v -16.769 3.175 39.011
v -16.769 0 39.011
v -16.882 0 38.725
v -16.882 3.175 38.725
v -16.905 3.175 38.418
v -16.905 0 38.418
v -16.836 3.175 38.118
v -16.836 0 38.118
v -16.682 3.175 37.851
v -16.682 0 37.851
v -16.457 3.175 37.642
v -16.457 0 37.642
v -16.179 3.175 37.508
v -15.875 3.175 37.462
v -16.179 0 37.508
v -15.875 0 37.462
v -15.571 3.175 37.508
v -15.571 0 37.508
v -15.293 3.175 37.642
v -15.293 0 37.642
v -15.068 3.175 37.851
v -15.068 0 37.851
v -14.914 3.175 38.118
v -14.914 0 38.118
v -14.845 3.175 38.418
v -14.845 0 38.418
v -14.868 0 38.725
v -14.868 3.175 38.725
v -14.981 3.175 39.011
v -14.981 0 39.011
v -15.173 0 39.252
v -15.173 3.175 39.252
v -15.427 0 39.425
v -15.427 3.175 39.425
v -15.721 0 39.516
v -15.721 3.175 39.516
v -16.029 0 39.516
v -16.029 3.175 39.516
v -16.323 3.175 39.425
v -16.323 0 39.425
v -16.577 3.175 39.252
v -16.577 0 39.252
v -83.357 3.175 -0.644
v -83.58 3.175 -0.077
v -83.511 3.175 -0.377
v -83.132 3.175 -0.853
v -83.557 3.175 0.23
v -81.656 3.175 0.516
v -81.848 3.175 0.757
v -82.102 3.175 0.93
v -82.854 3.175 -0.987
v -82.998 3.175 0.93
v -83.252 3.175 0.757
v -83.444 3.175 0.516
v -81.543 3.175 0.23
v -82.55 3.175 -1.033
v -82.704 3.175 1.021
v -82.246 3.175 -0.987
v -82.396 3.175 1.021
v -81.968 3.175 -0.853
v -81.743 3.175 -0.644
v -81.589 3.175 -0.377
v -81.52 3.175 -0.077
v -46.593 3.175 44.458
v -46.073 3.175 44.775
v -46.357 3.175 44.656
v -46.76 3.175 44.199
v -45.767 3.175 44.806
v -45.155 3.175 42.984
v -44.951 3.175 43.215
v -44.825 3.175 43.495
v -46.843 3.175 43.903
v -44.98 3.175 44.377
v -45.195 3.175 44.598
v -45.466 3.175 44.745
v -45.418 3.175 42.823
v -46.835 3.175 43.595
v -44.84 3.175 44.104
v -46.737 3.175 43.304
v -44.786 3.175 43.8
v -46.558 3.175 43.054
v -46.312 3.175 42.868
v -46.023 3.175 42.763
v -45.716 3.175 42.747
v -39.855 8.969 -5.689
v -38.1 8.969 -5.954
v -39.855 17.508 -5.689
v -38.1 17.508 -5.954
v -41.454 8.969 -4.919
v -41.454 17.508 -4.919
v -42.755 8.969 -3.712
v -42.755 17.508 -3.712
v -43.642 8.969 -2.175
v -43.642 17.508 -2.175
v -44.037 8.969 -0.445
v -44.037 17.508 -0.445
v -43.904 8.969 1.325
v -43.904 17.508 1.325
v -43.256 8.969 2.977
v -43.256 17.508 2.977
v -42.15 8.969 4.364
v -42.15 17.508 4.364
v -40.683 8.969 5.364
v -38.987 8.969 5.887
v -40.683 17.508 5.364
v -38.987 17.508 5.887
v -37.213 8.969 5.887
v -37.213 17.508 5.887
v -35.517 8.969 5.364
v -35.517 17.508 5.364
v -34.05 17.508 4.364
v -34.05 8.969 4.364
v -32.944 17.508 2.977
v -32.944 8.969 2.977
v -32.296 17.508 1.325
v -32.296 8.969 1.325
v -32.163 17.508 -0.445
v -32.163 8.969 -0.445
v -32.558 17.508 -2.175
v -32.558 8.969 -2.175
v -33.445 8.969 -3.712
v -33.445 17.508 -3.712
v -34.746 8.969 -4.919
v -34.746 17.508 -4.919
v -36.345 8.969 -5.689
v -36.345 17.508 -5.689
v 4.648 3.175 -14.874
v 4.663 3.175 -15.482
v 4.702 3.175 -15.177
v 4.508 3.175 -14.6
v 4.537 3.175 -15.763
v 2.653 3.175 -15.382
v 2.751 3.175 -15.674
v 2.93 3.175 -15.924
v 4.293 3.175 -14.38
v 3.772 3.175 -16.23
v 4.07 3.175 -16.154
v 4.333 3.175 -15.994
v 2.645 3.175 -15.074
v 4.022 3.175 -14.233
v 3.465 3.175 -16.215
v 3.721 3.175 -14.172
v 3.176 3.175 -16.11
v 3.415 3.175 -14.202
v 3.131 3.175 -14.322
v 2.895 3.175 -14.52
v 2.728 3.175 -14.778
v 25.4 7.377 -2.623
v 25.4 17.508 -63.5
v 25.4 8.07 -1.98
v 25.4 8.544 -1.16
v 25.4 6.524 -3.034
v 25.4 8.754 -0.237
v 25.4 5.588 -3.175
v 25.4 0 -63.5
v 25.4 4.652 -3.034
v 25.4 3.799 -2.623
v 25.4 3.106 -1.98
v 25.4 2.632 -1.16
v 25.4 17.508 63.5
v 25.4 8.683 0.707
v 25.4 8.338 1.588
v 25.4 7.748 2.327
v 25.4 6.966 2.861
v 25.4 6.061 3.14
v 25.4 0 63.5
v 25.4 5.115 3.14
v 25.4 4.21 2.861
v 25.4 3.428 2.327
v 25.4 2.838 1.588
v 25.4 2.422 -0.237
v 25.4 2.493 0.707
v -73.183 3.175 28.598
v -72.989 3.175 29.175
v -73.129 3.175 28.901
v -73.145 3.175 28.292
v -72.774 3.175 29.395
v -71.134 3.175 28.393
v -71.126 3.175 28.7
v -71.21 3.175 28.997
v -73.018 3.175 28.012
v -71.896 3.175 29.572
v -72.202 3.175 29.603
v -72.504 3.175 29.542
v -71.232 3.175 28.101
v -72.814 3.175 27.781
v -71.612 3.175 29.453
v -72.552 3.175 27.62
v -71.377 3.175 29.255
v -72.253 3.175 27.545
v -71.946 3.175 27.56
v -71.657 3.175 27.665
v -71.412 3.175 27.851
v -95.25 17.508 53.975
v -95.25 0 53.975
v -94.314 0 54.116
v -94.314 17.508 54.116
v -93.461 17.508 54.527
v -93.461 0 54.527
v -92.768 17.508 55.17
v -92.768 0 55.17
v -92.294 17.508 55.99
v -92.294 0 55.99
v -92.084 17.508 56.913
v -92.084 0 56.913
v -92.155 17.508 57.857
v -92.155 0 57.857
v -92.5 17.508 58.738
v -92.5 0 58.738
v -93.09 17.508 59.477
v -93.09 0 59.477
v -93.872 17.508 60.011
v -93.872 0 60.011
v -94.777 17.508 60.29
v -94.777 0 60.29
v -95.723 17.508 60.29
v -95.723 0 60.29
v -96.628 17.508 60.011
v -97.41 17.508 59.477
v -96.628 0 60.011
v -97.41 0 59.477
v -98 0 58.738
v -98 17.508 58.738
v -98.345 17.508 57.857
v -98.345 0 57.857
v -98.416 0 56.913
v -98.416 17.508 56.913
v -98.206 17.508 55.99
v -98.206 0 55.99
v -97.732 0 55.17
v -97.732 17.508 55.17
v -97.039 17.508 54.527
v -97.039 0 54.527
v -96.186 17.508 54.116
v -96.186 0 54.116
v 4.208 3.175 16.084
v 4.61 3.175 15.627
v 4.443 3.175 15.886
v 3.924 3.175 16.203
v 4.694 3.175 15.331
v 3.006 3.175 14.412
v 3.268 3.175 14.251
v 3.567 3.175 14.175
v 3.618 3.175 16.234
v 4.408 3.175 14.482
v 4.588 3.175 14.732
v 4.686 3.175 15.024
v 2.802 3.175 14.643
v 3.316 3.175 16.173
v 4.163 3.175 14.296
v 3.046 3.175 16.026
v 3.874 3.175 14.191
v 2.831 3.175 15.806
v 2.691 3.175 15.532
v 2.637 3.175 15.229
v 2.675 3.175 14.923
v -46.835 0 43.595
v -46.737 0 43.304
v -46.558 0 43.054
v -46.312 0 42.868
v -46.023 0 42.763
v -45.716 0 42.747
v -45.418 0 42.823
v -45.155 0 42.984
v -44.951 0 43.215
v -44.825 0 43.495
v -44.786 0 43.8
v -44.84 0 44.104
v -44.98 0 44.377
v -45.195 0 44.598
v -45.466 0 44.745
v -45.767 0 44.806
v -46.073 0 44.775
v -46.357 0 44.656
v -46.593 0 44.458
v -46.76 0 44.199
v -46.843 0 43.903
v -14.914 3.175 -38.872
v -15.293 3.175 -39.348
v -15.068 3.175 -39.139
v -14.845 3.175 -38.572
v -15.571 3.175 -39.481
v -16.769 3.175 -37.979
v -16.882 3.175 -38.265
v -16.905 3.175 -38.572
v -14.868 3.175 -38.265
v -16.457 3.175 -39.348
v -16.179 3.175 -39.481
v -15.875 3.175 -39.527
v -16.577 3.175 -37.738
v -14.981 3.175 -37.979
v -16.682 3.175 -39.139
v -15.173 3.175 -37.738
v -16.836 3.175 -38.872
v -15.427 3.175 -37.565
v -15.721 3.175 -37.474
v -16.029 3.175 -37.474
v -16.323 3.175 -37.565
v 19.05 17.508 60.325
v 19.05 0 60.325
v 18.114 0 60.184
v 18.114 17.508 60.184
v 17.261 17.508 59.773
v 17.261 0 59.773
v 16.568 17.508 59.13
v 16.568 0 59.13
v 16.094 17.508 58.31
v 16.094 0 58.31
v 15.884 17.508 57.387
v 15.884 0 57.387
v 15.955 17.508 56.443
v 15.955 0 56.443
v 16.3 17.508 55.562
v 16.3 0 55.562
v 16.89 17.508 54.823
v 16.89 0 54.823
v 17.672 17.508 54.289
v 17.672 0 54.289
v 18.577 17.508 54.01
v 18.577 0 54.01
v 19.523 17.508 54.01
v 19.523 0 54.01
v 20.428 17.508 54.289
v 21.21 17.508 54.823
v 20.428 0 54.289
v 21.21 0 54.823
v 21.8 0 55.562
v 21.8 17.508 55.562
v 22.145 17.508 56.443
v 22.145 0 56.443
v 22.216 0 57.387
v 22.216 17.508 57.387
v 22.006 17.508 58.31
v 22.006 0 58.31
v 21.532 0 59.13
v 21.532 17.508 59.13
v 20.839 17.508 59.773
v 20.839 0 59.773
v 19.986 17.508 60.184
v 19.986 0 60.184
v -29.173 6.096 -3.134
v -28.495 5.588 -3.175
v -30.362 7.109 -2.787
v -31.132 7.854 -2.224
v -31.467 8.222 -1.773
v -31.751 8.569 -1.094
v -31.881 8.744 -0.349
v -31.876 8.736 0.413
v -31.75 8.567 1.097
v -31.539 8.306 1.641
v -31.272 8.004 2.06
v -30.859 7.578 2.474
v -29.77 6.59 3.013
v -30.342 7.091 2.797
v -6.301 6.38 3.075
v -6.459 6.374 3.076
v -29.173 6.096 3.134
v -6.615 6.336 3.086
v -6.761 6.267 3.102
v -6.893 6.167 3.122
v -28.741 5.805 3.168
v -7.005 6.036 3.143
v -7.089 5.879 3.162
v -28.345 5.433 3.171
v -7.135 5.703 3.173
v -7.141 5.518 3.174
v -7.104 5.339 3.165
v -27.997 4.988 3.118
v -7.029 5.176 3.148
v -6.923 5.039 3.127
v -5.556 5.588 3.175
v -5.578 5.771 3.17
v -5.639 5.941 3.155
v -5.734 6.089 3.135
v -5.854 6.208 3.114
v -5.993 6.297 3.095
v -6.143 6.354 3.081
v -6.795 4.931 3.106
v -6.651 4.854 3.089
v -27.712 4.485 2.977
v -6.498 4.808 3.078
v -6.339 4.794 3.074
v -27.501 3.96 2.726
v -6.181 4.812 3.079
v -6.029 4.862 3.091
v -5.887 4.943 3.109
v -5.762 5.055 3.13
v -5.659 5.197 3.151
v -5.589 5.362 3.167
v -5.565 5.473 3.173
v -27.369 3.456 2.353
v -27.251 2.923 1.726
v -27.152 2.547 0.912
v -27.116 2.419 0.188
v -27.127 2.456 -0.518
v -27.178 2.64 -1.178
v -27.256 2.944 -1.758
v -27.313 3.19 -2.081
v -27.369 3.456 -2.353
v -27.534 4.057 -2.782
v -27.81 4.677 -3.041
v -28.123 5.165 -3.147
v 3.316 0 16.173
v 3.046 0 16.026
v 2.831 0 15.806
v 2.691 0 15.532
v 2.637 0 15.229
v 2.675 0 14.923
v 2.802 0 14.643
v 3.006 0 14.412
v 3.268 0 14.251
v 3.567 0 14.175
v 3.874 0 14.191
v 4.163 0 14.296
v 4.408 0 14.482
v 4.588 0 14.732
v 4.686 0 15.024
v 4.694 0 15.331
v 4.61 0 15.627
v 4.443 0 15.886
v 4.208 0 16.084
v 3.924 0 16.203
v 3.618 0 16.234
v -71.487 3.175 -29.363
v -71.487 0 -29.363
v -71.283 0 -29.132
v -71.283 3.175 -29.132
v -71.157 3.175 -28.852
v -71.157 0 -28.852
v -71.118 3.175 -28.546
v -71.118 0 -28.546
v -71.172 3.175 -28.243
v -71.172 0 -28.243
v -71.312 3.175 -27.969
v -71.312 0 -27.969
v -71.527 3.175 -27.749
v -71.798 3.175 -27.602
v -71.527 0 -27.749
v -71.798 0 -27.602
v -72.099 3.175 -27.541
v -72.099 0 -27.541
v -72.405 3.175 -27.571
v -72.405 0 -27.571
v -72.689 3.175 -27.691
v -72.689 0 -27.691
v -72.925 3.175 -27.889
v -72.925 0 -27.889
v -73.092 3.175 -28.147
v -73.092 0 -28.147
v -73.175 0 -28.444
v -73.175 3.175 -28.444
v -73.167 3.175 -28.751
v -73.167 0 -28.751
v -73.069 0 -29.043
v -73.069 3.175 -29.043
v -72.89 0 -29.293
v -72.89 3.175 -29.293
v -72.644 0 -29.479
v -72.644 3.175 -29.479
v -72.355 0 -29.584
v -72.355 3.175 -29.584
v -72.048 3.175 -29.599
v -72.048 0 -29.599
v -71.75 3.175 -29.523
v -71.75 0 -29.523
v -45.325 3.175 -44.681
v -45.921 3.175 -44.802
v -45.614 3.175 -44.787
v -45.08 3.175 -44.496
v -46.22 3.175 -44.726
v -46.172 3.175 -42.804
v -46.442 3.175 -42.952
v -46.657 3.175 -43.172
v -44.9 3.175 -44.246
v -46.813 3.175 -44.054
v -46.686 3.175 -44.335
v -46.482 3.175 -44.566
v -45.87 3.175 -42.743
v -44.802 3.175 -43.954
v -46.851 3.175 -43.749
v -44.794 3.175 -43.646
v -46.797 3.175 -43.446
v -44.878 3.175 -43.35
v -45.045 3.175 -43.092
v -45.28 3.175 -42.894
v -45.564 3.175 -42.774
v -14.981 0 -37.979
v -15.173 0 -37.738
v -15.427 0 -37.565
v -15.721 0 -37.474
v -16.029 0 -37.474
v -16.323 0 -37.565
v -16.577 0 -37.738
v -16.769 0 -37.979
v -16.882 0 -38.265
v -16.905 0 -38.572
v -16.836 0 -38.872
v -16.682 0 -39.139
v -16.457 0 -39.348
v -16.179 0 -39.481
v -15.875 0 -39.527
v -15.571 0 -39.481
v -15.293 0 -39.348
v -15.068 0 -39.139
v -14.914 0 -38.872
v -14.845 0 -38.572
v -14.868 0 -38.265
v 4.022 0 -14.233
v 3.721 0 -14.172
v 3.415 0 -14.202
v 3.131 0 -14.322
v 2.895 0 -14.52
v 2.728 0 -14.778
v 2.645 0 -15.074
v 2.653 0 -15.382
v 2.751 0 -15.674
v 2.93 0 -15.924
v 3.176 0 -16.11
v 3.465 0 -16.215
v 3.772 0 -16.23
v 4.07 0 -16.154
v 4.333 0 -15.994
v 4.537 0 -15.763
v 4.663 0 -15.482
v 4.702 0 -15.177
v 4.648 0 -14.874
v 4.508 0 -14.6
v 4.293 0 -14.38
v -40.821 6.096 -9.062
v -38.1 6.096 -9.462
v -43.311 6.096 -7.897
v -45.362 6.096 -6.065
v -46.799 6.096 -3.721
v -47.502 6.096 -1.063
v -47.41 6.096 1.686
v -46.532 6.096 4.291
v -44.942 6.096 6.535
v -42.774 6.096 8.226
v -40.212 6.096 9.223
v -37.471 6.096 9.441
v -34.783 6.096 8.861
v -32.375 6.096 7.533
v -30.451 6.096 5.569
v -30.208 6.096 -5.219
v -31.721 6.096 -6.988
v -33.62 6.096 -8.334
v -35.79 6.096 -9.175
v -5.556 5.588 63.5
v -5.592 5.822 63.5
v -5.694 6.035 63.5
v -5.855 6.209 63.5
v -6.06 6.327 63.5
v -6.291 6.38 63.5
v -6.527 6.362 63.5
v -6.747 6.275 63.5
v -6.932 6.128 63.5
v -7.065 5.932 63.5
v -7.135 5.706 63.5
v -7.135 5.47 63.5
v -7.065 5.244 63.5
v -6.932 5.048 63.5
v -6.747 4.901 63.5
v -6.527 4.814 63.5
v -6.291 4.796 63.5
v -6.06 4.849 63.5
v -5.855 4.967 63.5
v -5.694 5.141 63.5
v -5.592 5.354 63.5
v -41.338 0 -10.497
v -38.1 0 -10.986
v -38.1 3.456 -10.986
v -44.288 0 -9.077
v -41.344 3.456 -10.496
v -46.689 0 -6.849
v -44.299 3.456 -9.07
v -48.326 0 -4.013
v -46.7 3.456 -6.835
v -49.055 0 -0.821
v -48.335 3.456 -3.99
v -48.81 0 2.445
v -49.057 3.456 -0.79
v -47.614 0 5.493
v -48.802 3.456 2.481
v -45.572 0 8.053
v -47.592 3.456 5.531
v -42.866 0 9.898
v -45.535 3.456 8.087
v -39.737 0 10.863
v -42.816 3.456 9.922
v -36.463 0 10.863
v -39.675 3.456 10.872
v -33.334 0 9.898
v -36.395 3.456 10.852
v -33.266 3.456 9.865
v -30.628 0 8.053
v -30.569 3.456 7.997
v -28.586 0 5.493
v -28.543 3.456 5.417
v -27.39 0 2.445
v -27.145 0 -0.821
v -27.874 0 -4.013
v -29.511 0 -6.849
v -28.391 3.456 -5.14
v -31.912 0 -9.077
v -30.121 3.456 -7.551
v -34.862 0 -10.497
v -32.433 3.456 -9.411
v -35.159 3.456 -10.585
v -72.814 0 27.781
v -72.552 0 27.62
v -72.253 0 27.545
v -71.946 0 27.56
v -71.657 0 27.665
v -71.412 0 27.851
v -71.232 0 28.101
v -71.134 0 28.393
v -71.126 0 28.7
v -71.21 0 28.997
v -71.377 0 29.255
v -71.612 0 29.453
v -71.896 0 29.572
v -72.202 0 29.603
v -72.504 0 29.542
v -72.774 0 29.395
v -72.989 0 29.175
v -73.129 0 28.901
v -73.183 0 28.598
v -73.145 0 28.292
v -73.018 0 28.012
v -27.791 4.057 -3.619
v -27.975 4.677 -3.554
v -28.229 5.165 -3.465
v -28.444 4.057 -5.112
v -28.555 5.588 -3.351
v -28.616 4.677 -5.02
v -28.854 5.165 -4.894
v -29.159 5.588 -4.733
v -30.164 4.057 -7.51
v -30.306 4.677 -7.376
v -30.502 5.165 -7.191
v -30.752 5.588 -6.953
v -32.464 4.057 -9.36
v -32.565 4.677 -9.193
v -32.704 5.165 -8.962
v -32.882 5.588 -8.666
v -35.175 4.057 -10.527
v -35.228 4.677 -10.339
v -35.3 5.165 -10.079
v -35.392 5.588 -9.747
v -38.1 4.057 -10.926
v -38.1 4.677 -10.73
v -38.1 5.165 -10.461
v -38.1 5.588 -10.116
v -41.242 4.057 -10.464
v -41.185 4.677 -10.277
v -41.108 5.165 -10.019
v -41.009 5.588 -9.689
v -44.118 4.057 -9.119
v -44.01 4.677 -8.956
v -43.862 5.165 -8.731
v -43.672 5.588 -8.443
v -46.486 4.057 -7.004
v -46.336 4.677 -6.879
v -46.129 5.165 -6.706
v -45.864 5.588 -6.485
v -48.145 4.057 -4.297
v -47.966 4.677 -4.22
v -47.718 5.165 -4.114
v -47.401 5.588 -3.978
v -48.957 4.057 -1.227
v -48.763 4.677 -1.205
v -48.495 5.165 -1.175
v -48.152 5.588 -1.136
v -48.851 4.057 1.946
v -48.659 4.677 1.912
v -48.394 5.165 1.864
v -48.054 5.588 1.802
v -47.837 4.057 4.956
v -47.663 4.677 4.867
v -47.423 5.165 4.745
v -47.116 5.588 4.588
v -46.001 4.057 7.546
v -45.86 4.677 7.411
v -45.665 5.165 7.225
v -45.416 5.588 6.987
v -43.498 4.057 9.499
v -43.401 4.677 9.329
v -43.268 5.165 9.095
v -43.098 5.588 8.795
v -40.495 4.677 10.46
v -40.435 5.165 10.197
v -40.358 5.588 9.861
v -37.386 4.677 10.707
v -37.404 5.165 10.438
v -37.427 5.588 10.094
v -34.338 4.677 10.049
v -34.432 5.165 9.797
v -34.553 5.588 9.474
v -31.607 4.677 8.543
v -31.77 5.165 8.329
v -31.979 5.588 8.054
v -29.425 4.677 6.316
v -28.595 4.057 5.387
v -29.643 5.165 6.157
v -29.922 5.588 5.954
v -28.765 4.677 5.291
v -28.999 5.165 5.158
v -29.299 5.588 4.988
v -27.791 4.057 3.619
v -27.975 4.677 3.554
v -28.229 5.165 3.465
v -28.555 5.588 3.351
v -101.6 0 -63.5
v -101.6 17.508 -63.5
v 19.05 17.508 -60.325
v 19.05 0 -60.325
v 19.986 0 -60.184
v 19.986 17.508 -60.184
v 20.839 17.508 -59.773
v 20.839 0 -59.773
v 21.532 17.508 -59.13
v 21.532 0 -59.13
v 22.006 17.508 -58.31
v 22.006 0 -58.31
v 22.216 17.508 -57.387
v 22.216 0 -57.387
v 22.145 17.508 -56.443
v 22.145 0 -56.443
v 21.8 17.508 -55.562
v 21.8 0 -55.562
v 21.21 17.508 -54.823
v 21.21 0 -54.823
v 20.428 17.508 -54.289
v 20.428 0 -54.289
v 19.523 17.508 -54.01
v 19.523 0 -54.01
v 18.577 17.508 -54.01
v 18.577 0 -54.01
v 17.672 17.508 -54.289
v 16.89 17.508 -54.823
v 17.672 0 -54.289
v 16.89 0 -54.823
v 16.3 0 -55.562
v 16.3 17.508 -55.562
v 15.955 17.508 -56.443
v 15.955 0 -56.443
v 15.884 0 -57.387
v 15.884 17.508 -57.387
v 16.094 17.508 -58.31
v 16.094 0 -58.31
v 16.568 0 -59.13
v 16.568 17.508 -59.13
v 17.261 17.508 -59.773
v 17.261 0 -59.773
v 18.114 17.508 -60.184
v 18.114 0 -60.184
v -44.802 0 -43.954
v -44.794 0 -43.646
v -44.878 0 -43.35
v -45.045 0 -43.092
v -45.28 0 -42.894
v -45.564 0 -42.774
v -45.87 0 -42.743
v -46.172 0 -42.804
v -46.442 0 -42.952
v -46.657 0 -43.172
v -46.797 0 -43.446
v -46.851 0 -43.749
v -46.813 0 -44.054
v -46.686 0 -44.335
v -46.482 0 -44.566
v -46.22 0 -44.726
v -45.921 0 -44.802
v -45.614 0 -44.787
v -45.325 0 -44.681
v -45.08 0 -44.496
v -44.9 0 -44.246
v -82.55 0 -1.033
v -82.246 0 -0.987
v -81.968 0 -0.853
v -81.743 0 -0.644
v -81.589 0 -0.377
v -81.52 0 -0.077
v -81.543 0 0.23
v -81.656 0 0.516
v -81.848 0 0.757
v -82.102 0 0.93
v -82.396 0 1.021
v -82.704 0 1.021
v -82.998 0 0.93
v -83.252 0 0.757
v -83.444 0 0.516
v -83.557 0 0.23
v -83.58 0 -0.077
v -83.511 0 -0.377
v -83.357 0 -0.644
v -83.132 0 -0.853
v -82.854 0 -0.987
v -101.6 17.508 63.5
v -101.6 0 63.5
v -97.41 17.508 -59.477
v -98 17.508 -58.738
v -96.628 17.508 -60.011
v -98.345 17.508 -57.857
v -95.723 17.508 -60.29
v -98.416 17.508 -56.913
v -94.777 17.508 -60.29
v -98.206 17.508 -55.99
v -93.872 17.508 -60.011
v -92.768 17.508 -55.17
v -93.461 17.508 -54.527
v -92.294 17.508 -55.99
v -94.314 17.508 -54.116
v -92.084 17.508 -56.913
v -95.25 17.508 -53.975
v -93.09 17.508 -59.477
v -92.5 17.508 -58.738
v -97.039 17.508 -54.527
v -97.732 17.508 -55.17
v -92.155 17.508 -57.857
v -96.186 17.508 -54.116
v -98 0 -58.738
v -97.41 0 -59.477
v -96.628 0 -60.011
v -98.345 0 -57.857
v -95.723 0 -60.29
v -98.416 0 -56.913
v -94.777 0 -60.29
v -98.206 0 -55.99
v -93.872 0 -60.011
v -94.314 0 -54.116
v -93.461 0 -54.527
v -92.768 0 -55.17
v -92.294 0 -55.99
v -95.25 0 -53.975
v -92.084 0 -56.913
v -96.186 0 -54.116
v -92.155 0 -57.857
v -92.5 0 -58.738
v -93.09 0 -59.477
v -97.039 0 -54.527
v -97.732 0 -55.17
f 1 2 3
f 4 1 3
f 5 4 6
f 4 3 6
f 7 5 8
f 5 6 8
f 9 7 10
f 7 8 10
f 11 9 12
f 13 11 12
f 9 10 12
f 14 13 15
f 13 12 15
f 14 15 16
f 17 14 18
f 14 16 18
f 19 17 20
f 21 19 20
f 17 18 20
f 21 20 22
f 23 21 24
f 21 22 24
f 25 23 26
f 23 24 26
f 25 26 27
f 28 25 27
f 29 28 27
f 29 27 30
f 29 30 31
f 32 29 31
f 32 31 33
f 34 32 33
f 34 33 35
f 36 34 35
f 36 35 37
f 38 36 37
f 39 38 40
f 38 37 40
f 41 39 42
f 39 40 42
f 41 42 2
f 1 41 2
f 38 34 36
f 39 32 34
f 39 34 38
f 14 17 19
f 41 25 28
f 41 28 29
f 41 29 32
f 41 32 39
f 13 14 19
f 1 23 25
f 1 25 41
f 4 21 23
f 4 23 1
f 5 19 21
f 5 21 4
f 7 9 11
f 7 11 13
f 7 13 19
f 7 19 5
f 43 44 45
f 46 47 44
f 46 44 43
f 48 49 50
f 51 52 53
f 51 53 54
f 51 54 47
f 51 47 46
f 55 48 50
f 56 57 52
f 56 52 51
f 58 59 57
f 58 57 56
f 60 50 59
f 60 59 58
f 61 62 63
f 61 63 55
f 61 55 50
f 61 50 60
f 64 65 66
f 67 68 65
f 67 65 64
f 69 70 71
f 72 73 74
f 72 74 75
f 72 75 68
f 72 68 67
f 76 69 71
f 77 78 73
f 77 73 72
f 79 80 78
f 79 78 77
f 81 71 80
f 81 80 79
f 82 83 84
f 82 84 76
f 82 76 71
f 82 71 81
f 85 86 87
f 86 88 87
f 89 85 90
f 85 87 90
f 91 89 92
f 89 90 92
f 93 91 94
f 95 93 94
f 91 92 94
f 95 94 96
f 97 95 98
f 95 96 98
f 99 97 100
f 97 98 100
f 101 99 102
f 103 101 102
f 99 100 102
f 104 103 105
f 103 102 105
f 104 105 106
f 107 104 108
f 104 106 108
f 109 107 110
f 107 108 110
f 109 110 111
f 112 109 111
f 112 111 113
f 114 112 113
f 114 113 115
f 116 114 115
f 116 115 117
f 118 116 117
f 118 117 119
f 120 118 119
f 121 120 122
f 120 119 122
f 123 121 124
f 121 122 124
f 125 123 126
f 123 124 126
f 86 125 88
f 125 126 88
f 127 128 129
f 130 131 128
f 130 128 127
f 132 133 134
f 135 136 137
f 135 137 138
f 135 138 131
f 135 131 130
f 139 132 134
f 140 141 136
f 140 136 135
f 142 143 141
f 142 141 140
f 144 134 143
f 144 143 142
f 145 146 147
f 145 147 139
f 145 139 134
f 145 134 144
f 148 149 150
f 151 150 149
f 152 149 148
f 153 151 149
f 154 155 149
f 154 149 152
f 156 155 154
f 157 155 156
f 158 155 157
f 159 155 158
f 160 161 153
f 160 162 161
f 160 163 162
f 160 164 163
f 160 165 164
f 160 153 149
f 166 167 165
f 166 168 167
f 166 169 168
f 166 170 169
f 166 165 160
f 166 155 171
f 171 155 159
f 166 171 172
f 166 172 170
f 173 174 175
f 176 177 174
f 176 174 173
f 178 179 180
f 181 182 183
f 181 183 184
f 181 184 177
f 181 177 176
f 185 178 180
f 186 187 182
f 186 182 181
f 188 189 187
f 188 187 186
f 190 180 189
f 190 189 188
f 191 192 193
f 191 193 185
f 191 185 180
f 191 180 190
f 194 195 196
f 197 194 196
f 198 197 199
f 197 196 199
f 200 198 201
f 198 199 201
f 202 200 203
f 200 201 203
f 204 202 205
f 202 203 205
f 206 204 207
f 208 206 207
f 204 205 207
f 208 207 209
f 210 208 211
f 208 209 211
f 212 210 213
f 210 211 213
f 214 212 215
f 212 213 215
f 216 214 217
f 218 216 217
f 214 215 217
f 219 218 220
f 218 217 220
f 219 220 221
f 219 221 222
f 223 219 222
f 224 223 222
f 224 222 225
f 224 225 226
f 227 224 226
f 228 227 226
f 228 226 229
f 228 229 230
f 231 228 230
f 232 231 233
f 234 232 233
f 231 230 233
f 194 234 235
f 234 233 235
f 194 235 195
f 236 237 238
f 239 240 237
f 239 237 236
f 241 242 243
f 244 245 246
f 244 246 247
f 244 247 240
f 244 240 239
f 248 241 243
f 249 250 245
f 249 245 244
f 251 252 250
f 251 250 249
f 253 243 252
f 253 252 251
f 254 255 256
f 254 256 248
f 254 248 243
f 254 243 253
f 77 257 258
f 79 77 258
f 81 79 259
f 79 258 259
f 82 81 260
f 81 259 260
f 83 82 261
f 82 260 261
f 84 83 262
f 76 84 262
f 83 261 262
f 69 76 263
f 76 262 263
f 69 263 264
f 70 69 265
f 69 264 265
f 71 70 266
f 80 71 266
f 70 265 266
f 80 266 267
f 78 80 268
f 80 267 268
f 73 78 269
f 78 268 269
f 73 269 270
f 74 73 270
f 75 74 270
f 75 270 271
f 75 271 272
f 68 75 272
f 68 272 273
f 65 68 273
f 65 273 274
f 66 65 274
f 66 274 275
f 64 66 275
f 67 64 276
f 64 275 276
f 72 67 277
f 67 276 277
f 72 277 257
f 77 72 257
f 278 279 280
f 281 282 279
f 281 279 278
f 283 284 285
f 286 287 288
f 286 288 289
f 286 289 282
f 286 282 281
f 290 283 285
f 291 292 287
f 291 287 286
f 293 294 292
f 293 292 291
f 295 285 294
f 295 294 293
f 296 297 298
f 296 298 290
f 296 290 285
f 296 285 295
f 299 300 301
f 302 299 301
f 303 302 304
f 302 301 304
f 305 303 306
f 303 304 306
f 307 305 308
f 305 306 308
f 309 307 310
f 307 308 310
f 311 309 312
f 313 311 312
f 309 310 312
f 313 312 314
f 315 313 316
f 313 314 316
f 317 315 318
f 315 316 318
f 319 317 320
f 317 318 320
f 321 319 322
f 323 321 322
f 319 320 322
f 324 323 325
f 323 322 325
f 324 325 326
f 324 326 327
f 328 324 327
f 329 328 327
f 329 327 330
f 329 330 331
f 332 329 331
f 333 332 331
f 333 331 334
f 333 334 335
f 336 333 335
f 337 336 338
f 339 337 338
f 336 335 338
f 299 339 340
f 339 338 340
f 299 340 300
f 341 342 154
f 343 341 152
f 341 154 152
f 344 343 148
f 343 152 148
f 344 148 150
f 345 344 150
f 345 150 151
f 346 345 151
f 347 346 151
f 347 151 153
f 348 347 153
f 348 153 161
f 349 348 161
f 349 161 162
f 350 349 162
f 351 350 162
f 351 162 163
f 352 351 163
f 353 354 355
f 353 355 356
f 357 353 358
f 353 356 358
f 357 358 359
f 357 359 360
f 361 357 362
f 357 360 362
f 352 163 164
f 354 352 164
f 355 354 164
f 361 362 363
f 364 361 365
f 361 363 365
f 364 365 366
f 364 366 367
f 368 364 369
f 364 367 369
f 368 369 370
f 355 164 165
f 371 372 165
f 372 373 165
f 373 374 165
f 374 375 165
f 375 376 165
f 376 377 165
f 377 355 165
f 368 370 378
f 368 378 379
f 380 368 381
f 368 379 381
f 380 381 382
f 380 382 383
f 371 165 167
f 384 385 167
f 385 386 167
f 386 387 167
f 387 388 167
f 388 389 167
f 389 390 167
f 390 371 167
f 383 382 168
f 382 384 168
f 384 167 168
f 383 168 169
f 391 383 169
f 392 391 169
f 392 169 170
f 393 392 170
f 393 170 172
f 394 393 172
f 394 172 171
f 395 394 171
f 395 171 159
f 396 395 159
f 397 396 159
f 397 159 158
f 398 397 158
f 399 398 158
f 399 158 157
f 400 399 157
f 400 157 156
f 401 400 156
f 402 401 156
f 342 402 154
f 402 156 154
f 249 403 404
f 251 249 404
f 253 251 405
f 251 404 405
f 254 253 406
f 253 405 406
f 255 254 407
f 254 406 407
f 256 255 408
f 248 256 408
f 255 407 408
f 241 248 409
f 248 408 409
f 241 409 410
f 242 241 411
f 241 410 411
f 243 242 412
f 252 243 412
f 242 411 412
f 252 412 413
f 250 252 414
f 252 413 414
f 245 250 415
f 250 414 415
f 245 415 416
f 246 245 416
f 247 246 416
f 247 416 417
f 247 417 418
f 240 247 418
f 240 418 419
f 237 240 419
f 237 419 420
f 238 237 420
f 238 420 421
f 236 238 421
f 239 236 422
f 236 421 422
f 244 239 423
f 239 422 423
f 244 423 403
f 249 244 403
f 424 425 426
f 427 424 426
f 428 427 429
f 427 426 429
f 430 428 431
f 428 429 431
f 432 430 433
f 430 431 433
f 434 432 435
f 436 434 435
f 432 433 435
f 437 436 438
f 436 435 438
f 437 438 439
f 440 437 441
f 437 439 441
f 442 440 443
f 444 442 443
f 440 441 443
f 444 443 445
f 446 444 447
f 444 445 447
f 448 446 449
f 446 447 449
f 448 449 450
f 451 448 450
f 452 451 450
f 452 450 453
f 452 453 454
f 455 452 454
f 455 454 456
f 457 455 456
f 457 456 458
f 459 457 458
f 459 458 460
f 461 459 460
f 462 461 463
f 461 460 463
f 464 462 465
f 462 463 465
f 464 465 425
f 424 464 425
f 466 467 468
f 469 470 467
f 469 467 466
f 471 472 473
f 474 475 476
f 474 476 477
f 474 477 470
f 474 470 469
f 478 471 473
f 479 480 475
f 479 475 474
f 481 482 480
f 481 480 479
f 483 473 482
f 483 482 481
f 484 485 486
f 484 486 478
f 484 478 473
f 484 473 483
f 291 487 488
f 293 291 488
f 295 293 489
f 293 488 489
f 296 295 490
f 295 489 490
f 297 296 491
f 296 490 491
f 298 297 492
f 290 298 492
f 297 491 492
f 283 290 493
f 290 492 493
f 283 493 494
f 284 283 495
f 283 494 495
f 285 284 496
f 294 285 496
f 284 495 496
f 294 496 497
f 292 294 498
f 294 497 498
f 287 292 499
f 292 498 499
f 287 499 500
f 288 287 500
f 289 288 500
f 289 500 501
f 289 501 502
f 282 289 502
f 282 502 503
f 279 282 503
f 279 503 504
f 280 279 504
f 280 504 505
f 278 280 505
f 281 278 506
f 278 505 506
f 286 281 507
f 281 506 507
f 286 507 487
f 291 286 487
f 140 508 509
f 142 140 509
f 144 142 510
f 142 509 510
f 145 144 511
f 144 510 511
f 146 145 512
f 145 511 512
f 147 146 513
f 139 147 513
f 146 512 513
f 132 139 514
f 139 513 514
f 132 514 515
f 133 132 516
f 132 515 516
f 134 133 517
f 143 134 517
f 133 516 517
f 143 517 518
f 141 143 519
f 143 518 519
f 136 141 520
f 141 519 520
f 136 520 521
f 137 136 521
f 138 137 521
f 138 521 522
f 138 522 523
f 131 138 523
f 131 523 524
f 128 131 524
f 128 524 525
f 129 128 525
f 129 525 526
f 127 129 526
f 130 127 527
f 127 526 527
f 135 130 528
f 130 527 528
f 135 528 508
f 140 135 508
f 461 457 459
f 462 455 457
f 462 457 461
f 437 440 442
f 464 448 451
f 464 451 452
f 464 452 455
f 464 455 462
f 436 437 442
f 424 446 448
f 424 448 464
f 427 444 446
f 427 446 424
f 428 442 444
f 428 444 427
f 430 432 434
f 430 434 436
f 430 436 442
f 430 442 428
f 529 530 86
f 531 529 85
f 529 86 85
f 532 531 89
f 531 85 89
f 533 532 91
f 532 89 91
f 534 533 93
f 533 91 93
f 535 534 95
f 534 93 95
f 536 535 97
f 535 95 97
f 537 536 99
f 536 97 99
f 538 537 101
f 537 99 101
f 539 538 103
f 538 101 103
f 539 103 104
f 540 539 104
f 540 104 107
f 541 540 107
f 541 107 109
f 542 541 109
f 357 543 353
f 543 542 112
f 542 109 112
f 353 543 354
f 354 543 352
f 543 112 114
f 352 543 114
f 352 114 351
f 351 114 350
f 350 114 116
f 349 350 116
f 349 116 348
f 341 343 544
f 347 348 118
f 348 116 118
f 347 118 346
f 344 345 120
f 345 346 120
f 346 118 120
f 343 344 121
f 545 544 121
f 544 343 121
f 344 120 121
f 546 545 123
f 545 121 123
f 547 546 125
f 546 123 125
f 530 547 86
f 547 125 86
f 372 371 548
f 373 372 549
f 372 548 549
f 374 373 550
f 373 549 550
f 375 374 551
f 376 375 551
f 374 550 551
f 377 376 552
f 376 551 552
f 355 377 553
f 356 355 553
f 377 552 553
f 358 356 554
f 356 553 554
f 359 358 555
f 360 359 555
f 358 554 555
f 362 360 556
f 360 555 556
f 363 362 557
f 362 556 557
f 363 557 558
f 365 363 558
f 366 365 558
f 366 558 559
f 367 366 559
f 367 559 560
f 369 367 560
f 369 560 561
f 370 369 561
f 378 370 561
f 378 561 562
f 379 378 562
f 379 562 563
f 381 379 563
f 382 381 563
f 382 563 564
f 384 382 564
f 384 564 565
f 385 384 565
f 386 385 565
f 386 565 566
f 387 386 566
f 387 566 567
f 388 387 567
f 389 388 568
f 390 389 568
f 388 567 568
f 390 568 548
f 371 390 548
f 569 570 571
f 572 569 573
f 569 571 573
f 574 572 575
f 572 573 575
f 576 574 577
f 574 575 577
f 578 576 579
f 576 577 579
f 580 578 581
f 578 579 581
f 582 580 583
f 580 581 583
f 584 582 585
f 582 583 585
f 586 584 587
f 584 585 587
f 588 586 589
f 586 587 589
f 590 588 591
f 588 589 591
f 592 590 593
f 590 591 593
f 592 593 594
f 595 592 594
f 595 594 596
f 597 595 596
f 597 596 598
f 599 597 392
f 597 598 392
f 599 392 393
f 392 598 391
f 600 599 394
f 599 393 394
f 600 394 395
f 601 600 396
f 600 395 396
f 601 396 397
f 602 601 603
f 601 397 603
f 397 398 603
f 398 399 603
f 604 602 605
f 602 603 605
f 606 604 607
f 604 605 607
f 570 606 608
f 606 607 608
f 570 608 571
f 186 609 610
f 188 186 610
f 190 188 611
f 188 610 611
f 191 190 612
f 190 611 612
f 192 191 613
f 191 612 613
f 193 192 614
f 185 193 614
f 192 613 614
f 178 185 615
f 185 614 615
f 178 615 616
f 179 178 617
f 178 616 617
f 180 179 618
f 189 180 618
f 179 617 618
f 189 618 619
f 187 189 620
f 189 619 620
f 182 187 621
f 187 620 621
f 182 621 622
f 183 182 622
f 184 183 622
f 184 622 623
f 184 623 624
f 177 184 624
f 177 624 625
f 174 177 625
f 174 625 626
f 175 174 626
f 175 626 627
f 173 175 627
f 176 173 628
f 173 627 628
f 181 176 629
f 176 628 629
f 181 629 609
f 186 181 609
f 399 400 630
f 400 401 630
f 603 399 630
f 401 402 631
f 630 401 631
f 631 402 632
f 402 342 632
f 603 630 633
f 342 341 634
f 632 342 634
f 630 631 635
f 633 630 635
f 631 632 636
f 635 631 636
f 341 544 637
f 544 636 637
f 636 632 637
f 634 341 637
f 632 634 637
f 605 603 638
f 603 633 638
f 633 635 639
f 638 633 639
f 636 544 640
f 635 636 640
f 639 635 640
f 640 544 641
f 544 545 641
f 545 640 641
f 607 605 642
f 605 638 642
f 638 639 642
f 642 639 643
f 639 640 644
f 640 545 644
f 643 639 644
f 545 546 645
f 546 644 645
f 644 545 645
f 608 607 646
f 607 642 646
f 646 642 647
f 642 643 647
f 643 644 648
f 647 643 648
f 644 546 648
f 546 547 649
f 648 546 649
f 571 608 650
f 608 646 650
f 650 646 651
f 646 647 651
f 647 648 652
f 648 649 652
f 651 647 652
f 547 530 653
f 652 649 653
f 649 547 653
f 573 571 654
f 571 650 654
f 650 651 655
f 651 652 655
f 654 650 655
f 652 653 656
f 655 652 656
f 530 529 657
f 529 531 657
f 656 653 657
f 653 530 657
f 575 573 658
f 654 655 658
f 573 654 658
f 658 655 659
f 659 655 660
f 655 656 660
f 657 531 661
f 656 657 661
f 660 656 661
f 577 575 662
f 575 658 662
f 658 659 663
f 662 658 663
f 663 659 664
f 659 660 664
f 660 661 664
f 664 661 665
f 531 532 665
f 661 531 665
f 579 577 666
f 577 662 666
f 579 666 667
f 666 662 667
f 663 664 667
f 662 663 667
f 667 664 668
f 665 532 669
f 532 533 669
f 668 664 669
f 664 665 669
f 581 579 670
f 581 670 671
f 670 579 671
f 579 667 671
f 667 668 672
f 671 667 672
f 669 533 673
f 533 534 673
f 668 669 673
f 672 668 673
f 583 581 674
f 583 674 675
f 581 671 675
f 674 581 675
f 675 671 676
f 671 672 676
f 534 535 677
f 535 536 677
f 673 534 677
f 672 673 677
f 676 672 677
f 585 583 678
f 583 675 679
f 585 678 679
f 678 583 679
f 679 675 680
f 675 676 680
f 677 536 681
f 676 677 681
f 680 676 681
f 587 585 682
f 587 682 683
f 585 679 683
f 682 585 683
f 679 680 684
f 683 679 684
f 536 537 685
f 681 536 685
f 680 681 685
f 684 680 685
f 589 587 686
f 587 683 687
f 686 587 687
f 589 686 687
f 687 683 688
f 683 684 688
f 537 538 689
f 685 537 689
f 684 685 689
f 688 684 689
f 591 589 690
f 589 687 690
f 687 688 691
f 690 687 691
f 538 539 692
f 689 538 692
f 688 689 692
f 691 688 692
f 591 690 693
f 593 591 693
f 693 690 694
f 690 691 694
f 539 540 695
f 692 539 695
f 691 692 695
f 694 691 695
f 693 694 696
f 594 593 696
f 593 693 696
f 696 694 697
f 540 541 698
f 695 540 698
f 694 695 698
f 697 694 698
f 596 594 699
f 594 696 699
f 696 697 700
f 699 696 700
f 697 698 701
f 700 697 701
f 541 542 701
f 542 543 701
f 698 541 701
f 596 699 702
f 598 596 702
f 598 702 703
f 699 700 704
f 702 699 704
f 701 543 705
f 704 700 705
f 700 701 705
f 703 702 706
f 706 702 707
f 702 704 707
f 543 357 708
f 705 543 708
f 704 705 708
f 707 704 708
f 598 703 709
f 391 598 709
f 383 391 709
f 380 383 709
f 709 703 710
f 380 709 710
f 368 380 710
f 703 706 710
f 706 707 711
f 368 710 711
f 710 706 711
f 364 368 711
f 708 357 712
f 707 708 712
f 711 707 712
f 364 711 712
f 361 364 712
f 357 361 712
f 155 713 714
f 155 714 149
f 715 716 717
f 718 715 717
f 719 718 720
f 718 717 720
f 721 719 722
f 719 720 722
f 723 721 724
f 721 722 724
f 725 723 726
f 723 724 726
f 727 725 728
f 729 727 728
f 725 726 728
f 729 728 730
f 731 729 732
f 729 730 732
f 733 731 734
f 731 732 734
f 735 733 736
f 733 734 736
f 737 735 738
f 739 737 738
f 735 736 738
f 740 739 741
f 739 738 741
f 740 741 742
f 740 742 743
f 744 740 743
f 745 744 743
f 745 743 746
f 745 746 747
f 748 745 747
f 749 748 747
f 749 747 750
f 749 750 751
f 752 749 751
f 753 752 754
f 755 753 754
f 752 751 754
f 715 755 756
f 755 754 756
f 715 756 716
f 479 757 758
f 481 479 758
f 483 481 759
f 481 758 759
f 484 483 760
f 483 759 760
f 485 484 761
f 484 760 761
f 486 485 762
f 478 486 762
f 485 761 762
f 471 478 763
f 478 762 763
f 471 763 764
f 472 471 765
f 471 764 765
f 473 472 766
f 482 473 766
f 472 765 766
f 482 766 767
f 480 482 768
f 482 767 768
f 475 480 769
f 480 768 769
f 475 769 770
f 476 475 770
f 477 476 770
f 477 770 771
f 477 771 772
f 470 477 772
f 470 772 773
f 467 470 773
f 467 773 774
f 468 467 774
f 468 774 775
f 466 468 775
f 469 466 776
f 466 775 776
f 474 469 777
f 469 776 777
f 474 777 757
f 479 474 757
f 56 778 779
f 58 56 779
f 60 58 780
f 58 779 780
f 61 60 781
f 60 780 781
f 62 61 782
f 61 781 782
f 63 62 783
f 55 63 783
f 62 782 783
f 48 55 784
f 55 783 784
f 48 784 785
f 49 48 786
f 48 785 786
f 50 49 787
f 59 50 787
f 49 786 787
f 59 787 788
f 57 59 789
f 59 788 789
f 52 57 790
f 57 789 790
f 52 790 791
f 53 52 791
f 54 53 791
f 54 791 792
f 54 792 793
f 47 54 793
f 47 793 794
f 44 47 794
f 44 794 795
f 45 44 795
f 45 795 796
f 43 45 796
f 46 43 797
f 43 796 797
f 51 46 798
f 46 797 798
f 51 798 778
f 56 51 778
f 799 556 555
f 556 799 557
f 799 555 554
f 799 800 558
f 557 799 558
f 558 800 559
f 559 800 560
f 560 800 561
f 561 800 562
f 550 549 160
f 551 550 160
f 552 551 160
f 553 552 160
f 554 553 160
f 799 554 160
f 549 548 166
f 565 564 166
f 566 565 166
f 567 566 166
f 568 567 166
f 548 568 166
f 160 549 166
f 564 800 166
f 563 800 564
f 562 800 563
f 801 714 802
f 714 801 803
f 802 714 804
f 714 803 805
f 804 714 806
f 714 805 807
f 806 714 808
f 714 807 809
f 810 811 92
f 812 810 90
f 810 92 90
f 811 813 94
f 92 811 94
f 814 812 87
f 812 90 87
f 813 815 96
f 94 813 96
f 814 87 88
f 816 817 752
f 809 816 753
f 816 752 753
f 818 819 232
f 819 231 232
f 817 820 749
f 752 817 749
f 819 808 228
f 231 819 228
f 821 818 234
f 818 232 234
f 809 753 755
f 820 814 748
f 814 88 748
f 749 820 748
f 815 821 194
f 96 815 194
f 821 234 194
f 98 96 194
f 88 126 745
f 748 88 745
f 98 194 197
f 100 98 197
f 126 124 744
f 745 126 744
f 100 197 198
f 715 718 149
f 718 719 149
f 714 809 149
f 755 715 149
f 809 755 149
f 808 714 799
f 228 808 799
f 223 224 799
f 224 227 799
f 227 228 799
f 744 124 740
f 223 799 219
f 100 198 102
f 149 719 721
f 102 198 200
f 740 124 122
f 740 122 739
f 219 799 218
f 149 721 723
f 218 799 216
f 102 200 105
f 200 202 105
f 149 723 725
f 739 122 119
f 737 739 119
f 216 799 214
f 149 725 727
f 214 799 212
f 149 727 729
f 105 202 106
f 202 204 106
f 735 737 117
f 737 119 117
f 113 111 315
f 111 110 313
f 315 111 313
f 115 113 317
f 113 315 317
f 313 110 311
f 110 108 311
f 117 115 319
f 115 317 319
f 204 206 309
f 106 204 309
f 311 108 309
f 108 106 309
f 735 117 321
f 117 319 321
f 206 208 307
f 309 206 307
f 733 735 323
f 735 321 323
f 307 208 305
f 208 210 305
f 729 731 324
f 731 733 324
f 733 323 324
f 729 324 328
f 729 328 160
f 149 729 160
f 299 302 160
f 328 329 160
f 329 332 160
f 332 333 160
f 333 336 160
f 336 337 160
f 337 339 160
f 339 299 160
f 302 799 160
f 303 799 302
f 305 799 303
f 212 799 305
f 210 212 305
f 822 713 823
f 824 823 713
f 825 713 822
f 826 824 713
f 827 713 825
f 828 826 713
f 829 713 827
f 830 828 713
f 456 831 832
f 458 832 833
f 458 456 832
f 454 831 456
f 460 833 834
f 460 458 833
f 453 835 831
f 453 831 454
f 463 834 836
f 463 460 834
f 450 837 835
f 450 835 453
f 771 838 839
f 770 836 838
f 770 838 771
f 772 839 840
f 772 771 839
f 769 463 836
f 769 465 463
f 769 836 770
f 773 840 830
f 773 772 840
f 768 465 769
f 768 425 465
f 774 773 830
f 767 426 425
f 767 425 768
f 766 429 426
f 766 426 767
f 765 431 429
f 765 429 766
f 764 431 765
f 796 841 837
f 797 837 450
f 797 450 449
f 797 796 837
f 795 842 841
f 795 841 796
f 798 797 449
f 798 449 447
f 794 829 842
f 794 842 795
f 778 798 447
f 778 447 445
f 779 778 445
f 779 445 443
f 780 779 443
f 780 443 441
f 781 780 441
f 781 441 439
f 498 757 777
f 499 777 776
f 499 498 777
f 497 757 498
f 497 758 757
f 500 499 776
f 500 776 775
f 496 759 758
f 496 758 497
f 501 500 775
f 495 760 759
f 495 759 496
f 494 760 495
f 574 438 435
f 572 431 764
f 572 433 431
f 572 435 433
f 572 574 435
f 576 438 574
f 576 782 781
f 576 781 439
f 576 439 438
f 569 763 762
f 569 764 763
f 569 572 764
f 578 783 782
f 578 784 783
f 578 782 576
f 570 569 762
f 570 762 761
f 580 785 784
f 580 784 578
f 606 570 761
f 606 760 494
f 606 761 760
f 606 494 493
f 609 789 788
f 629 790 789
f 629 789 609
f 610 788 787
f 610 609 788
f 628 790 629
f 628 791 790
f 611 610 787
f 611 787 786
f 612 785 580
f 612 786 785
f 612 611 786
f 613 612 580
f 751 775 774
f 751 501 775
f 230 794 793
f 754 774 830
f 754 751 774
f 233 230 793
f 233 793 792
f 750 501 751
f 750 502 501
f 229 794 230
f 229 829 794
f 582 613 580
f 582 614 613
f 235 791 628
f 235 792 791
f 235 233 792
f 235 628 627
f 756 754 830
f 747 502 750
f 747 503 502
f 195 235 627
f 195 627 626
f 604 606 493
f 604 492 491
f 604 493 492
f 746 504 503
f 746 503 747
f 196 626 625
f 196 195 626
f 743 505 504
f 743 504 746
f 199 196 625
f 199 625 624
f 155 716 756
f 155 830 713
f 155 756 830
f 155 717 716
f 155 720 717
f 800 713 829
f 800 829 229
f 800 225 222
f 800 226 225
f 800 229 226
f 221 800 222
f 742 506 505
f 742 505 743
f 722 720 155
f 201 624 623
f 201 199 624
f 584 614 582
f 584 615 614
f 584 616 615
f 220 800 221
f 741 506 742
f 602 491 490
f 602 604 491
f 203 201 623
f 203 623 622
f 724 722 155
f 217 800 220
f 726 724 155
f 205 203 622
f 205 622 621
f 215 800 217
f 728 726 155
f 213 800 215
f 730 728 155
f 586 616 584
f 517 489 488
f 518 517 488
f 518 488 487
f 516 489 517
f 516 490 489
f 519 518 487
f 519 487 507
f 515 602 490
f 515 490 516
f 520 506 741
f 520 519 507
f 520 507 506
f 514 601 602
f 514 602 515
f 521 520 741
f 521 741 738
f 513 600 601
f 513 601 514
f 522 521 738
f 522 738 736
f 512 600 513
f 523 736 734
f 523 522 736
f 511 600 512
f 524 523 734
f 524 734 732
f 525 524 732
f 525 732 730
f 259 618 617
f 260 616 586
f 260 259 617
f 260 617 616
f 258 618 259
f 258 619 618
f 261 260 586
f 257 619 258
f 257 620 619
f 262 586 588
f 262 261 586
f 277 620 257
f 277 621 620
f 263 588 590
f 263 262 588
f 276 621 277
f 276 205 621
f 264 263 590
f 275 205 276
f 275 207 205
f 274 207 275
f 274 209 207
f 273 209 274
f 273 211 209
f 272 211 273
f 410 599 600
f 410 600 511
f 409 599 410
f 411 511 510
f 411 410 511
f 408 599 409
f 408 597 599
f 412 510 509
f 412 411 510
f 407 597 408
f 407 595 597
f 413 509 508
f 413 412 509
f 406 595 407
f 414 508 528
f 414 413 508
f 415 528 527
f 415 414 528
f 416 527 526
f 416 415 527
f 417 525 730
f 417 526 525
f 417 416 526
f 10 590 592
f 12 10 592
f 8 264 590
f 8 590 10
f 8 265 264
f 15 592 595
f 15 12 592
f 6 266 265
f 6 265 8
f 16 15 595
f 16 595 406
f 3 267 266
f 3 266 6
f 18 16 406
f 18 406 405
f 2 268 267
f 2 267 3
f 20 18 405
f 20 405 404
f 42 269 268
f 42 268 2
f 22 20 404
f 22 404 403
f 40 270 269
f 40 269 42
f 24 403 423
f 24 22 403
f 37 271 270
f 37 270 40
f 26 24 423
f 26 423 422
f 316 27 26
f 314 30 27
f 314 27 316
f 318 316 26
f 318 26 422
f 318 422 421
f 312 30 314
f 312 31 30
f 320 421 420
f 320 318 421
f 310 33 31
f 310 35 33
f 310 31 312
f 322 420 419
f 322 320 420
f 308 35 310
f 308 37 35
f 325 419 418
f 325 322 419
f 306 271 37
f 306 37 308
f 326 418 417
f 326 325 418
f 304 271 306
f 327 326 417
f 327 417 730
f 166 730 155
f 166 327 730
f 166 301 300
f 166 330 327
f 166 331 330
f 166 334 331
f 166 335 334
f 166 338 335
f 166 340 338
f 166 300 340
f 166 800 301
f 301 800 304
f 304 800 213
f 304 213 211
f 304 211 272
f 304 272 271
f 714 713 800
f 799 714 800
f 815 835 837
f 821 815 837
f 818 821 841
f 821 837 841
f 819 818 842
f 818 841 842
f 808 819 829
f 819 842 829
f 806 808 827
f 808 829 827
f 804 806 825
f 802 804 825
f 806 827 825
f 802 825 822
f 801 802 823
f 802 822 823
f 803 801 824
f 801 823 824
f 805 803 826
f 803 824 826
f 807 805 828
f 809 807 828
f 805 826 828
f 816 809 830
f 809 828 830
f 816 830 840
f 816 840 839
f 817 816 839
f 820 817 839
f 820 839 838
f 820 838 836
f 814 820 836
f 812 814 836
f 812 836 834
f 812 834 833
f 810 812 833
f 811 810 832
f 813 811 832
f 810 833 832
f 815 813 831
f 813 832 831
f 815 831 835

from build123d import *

# Parameters (mm, degrees)
SKETCH5_W               = 127
SKETCH5_H               = 127
SKETCH5_R               = 38.1
SKETCH5_R_2             = 3.175
BOSS_EXTRUDE2_DEPTH     = 17.50822
SKETCH4_R               = 1.03251
CUT_EXTRUDE3_DEPTH      = 3.175
CIRPATTERN1_COUNT       = 9
CUT_EXTRUDE5_REACH      = 145.066
SKETCH8_R               = 3.175
CUT_EXTRUDE9_REACH      = 165.579
CUT_EXTRUDE9_END_RADIUS = 3.175
SKETCH10_R              = 0.79375


with BuildPart() as part:
    # Sketch1 → Revolve1 (revolve)
    with BuildSketch(Plane.XY, mode=Mode.PRIVATE) as revolve1_sk:
        with BuildLine():
            Line((-32.14624, 17.50822), (0, 17.50822))
            Line((0, 17.50822), (0, 0))
            Line((0, 0), (-27.1145, 0))
            Line((-27.1145, 0), (-27.1145, 3.456354569))
            ThreePointArc((-27.1145, 3.456354569), (-27.522854569, 4.980354569), (-28.6385, 6.096))
            Line((-28.6385, 6.096), (-32.14624, 8.96874))
            Line((-32.14624, 8.96874), (-32.14624, 17.50822))
        make_face()
    revolve(revolve1_sk.sketch.rotate(Axis((-38.1, 101.60464546, 0), (0, 1, 0)), 90), axis=Axis((-38.1, 101.60464546, 0), (0, 1, 0)))

    # Sketch5 → Boss-Extrude2 (add)
    with BuildSketch(Plane.XZ):
        with Locations((-38.1, 0)):
            Rectangle(SKETCH5_W, SKETCH5_H)
        with Locations((-38.1, 0)):
            Circle(SKETCH5_R, mode=Mode.SUBTRACT)
        with Locations(Location((-95.25, 57.15, 0), (0, 0, 270))):
            Circle(SKETCH5_R_2, mode=Mode.SUBTRACT)
        with Locations(Location((19.05, 57.15, 0), (0, 0, 90))):
            Circle(SKETCH5_R_2, mode=Mode.SUBTRACT)
        with Locations(Location((19.05, -57.15, 0), (0, 0, 270))):
            Circle(SKETCH5_R_2, mode=Mode.SUBTRACT)
        with Locations(Location((-95.25, -57.15, 0), (0, 0, 90))):
            Circle(SKETCH5_R_2, mode=Mode.SUBTRACT)
    extrude(amount=-BOSS_EXTRUDE2_DEPTH)

    # Sketch4 → Cut-Extrude3 (cut)
    with BuildSketch(Plane(origin=(0, 0, 0), x_dir=(-1, 0, 0), z_dir=(0, -1, 0))):
        with Locations(Location((82.55, 0, 0), (0, 0, 90))):
            Circle(SKETCH4_R)
    cut_extrude3 = extrude(amount=-CUT_EXTRUDE3_DEPTH, mode=Mode.SUBTRACT)

    # CirPattern1: Cut-Extrude3 ×9 about axis
    cirpattern1_axis = Axis((-38.1, 0, 0), (0, 1, 0))
    for i in range(1, CIRPATTERN1_COUNT):
        add(cut_extrude3.rotate(cirpattern1_axis, i * 360 / CIRPATTERN1_COUNT), mode=Mode.SUBTRACT)

    # Sketch8 → Cut-Extrude5 (cut, up to next)
    with BuildSketch(Plane(origin=(25.4, 0, 0), x_dir=(0, 0, -1), z_dir=(1, 0, 0)), mode=Mode.PRIVATE) as cut_extrude5_sk1:
        with Locations((0, 5.588)):
            Circle(SKETCH8_R)
    cut_extrude5_tool1 = extrude(cut_extrude5_sk1.sketch, amount=-CUT_EXTRUDE5_REACH, mode=Mode.PRIVATE) & part.part
    add(cut_extrude5_tool1.solids().sort_by_distance((25.4, 5.588, 0))[0], mode=Mode.SUBTRACT)

    # Cut-Extrude9: up to this cylinder (the profile starts outside it)
    cut_extrude9_end = Plane(origin=(-6.35, 5.588, 0), z_dir=(1, 0, 0)) * Cylinder(CUT_EXTRUDE9_END_RADIUS, 338.508, mode=Mode.PRIVATE)
    # Sketch10 → Cut-Extrude9 (cut, up to the surface)
    with BuildSketch(Plane.XY.offset(63.5), mode=Mode.PRIVATE) as cut_extrude9_sk1:
        with Locations((-6.35, 5.588)):
            Circle(SKETCH10_R)
    cut_extrude9_tool1 = extrude(cut_extrude9_sk1.sketch, amount=-CUT_EXTRUDE9_REACH, mode=Mode.PRIVATE) - cut_extrude9_end
    add(cut_extrude9_tool1.solids().sort_by_distance((-6.35, 5.588, 63.5))[0], mode=Mode.SUBTRACT)


solid = part.part
